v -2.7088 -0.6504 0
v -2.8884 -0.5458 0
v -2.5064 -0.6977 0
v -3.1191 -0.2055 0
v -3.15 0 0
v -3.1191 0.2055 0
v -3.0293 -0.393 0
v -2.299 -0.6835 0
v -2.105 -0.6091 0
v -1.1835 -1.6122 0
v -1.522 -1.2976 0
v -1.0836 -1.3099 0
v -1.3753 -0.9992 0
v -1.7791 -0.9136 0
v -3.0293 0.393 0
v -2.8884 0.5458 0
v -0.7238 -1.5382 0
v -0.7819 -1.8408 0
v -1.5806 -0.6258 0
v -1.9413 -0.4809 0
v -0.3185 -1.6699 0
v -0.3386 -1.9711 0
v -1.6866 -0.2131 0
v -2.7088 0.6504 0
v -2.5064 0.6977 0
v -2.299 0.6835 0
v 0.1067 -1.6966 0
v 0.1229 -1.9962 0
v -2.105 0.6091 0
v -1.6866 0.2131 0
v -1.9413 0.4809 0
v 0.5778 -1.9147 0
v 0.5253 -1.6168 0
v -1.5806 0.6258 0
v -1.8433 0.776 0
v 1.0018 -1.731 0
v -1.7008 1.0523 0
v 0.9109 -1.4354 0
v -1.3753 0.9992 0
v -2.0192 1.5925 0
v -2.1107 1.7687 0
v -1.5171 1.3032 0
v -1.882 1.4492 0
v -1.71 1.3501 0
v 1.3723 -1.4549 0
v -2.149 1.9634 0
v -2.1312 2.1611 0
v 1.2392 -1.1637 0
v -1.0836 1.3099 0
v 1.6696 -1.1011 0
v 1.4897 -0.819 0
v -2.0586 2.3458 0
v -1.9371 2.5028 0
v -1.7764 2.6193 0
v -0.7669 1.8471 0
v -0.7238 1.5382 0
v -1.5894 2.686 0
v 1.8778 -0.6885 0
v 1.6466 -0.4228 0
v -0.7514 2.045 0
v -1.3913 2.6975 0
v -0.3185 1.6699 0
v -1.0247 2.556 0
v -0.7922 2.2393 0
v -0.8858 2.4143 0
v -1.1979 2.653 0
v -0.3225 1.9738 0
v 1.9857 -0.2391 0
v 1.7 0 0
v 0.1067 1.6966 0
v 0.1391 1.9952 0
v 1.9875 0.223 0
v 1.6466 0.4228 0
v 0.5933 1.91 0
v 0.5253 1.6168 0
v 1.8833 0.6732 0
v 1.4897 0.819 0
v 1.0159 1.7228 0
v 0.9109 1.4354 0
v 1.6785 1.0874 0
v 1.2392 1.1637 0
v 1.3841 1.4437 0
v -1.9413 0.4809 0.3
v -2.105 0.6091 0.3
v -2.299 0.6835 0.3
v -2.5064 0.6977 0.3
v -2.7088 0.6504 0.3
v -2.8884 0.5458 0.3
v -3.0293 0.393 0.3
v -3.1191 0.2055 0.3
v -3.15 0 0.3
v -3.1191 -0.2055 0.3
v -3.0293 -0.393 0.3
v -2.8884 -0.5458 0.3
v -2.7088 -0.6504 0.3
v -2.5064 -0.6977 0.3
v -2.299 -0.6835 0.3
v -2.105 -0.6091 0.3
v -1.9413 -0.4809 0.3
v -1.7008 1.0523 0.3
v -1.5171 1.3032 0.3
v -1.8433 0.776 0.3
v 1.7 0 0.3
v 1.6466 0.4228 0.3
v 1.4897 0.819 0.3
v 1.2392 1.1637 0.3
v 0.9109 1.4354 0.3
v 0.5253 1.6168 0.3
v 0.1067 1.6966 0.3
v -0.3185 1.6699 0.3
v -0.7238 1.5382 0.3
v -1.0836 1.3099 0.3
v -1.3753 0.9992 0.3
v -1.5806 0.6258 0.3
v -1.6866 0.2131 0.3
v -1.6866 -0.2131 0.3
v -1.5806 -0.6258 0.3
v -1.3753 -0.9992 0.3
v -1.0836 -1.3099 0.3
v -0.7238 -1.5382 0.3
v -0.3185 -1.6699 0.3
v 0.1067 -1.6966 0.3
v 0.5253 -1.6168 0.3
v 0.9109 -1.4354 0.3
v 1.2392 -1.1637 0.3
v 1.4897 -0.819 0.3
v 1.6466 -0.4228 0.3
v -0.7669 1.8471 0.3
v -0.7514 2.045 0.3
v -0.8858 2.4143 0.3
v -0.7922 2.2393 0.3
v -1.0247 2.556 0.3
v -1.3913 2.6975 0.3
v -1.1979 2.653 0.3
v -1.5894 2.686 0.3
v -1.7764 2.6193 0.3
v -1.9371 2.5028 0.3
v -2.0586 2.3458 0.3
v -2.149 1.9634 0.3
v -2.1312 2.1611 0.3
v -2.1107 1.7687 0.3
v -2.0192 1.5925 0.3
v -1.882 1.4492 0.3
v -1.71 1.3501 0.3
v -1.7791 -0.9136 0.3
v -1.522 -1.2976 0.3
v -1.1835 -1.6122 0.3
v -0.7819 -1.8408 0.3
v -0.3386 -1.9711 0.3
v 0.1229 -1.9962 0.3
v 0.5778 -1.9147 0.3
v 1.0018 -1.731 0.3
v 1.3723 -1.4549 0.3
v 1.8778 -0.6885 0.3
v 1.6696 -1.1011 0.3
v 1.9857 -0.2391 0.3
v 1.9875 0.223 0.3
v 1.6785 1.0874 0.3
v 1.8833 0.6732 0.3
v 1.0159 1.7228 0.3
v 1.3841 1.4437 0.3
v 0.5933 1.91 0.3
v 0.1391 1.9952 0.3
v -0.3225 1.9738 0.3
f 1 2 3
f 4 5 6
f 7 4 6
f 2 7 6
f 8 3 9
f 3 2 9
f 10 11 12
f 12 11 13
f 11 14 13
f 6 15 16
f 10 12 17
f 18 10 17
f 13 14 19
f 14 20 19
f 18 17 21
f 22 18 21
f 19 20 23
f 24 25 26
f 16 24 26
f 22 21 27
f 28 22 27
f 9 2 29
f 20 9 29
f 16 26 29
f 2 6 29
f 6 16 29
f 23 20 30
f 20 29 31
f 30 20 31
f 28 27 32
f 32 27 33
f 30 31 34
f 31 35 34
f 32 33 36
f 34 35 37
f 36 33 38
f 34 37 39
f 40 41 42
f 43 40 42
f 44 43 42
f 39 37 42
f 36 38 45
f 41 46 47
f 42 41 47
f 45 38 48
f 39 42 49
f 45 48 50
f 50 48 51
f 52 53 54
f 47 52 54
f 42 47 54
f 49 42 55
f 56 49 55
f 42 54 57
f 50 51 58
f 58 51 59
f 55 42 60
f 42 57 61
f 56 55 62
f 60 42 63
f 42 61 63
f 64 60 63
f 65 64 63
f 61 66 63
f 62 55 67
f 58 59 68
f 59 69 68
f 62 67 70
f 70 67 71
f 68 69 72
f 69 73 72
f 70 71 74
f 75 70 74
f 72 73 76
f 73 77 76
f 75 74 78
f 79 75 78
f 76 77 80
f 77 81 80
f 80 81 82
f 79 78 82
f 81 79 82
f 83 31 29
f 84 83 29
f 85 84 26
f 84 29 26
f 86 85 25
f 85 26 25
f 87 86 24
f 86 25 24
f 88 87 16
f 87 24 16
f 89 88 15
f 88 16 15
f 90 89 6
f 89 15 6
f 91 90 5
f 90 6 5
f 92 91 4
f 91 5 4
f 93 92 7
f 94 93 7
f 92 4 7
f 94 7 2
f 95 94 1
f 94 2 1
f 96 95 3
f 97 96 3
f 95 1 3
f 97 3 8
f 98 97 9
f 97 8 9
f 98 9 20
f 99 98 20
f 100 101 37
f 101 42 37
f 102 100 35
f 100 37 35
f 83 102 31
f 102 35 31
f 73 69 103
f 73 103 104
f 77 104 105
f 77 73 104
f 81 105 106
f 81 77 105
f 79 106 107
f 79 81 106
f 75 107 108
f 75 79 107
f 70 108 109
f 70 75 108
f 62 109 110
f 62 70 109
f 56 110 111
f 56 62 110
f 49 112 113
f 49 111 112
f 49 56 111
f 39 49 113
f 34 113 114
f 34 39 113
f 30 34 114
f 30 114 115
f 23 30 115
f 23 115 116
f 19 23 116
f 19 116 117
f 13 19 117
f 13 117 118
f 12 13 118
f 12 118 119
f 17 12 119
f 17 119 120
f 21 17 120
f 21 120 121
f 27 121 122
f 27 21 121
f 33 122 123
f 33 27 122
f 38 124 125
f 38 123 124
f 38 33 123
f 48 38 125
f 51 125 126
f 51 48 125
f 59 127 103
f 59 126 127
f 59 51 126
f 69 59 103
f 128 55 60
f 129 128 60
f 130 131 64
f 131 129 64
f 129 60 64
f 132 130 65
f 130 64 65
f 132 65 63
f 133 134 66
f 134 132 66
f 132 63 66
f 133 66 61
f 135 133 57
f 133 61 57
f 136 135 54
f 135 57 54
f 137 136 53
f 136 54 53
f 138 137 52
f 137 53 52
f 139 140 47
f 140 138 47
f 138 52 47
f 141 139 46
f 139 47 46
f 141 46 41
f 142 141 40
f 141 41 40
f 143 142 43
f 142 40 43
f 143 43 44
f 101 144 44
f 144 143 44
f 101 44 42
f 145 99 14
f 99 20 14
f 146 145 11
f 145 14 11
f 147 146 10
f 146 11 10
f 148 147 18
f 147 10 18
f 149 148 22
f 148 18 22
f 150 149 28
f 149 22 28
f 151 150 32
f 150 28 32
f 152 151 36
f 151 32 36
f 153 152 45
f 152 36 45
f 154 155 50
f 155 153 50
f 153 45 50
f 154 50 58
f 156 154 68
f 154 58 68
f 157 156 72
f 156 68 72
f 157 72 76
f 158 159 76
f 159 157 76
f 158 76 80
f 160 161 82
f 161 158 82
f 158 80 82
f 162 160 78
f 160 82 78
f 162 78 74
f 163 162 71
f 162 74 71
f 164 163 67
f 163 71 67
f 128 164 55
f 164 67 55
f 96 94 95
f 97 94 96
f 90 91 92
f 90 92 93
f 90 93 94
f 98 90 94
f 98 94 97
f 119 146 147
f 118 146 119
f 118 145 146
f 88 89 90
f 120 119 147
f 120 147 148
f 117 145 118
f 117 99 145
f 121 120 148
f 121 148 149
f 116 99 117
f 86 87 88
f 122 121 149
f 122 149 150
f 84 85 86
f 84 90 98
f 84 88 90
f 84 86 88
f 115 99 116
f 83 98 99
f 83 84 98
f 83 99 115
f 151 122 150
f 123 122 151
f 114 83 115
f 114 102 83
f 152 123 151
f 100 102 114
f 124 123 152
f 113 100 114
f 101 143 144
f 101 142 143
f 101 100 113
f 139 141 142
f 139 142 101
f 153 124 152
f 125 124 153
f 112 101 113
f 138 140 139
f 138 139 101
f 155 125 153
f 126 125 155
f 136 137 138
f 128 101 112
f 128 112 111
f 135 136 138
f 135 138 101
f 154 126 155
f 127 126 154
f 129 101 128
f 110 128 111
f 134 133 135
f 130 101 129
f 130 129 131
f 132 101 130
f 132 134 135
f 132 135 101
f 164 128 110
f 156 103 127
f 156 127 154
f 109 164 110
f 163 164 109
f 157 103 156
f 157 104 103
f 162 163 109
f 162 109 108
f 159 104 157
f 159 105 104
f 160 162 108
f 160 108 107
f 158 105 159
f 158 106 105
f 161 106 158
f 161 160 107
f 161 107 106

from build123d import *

# Parameters (mm, degrees)
CYLINDER003_R     = 0.7
CYLINDER003_DEPTH = 0.3
CYLINDER002_R     = 0.7
CYLINDER002_DEPTH = 0.3
CYLINDER001_R     = 1.7
CYLINDER001_DEPTH = 1
CYLINDER_R        = 2
CYLINDER_DEPTH    = 0.3


with BuildPart() as cylinder003:
    # Cylinder003 → Cylinder003 (new body)
    with BuildSketch(Plane(origin=(-2.45, 0, 0), x_dir=(1, 0, 0), z_dir=(0, 0, 1))):
        Circle(CYLINDER003_R)
    extrude(amount=CYLINDER003_DEPTH)


with BuildPart() as cylinder002:
    # Cylinder002 → Cylinder002 (new body)
    with BuildSketch(Plane(origin=(-1.45, 2, 0), x_dir=(1, 0, 0), z_dir=(0, 0, 1))):
        Circle(CYLINDER002_R)
    extrude(amount=CYLINDER002_DEPTH)


with BuildPart() as cylinder001:
    # Cylinder001 → Cylinder001 (new body)
    with BuildSketch(Plane.XY.offset(-0.5)):
        Circle(CYLINDER001_R)
    extrude(amount=CYLINDER001_DEPTH)


with BuildPart() as fusion001:
    # Cylinder → Cylinder (new body)
    with BuildSketch(Plane.XY):
        Circle(CYLINDER_R)
    extrude(amount=CYLINDER_DEPTH)

    # Cut: cut Cylinder001
    add(cylinder001.part, mode=Mode.SUBTRACT)

    # Fusion: union Cylinder002
    add(cylinder002.part)

    # Fusion001: union Cylinder003
    add(cylinder003.part)


solid = fusion001.part
